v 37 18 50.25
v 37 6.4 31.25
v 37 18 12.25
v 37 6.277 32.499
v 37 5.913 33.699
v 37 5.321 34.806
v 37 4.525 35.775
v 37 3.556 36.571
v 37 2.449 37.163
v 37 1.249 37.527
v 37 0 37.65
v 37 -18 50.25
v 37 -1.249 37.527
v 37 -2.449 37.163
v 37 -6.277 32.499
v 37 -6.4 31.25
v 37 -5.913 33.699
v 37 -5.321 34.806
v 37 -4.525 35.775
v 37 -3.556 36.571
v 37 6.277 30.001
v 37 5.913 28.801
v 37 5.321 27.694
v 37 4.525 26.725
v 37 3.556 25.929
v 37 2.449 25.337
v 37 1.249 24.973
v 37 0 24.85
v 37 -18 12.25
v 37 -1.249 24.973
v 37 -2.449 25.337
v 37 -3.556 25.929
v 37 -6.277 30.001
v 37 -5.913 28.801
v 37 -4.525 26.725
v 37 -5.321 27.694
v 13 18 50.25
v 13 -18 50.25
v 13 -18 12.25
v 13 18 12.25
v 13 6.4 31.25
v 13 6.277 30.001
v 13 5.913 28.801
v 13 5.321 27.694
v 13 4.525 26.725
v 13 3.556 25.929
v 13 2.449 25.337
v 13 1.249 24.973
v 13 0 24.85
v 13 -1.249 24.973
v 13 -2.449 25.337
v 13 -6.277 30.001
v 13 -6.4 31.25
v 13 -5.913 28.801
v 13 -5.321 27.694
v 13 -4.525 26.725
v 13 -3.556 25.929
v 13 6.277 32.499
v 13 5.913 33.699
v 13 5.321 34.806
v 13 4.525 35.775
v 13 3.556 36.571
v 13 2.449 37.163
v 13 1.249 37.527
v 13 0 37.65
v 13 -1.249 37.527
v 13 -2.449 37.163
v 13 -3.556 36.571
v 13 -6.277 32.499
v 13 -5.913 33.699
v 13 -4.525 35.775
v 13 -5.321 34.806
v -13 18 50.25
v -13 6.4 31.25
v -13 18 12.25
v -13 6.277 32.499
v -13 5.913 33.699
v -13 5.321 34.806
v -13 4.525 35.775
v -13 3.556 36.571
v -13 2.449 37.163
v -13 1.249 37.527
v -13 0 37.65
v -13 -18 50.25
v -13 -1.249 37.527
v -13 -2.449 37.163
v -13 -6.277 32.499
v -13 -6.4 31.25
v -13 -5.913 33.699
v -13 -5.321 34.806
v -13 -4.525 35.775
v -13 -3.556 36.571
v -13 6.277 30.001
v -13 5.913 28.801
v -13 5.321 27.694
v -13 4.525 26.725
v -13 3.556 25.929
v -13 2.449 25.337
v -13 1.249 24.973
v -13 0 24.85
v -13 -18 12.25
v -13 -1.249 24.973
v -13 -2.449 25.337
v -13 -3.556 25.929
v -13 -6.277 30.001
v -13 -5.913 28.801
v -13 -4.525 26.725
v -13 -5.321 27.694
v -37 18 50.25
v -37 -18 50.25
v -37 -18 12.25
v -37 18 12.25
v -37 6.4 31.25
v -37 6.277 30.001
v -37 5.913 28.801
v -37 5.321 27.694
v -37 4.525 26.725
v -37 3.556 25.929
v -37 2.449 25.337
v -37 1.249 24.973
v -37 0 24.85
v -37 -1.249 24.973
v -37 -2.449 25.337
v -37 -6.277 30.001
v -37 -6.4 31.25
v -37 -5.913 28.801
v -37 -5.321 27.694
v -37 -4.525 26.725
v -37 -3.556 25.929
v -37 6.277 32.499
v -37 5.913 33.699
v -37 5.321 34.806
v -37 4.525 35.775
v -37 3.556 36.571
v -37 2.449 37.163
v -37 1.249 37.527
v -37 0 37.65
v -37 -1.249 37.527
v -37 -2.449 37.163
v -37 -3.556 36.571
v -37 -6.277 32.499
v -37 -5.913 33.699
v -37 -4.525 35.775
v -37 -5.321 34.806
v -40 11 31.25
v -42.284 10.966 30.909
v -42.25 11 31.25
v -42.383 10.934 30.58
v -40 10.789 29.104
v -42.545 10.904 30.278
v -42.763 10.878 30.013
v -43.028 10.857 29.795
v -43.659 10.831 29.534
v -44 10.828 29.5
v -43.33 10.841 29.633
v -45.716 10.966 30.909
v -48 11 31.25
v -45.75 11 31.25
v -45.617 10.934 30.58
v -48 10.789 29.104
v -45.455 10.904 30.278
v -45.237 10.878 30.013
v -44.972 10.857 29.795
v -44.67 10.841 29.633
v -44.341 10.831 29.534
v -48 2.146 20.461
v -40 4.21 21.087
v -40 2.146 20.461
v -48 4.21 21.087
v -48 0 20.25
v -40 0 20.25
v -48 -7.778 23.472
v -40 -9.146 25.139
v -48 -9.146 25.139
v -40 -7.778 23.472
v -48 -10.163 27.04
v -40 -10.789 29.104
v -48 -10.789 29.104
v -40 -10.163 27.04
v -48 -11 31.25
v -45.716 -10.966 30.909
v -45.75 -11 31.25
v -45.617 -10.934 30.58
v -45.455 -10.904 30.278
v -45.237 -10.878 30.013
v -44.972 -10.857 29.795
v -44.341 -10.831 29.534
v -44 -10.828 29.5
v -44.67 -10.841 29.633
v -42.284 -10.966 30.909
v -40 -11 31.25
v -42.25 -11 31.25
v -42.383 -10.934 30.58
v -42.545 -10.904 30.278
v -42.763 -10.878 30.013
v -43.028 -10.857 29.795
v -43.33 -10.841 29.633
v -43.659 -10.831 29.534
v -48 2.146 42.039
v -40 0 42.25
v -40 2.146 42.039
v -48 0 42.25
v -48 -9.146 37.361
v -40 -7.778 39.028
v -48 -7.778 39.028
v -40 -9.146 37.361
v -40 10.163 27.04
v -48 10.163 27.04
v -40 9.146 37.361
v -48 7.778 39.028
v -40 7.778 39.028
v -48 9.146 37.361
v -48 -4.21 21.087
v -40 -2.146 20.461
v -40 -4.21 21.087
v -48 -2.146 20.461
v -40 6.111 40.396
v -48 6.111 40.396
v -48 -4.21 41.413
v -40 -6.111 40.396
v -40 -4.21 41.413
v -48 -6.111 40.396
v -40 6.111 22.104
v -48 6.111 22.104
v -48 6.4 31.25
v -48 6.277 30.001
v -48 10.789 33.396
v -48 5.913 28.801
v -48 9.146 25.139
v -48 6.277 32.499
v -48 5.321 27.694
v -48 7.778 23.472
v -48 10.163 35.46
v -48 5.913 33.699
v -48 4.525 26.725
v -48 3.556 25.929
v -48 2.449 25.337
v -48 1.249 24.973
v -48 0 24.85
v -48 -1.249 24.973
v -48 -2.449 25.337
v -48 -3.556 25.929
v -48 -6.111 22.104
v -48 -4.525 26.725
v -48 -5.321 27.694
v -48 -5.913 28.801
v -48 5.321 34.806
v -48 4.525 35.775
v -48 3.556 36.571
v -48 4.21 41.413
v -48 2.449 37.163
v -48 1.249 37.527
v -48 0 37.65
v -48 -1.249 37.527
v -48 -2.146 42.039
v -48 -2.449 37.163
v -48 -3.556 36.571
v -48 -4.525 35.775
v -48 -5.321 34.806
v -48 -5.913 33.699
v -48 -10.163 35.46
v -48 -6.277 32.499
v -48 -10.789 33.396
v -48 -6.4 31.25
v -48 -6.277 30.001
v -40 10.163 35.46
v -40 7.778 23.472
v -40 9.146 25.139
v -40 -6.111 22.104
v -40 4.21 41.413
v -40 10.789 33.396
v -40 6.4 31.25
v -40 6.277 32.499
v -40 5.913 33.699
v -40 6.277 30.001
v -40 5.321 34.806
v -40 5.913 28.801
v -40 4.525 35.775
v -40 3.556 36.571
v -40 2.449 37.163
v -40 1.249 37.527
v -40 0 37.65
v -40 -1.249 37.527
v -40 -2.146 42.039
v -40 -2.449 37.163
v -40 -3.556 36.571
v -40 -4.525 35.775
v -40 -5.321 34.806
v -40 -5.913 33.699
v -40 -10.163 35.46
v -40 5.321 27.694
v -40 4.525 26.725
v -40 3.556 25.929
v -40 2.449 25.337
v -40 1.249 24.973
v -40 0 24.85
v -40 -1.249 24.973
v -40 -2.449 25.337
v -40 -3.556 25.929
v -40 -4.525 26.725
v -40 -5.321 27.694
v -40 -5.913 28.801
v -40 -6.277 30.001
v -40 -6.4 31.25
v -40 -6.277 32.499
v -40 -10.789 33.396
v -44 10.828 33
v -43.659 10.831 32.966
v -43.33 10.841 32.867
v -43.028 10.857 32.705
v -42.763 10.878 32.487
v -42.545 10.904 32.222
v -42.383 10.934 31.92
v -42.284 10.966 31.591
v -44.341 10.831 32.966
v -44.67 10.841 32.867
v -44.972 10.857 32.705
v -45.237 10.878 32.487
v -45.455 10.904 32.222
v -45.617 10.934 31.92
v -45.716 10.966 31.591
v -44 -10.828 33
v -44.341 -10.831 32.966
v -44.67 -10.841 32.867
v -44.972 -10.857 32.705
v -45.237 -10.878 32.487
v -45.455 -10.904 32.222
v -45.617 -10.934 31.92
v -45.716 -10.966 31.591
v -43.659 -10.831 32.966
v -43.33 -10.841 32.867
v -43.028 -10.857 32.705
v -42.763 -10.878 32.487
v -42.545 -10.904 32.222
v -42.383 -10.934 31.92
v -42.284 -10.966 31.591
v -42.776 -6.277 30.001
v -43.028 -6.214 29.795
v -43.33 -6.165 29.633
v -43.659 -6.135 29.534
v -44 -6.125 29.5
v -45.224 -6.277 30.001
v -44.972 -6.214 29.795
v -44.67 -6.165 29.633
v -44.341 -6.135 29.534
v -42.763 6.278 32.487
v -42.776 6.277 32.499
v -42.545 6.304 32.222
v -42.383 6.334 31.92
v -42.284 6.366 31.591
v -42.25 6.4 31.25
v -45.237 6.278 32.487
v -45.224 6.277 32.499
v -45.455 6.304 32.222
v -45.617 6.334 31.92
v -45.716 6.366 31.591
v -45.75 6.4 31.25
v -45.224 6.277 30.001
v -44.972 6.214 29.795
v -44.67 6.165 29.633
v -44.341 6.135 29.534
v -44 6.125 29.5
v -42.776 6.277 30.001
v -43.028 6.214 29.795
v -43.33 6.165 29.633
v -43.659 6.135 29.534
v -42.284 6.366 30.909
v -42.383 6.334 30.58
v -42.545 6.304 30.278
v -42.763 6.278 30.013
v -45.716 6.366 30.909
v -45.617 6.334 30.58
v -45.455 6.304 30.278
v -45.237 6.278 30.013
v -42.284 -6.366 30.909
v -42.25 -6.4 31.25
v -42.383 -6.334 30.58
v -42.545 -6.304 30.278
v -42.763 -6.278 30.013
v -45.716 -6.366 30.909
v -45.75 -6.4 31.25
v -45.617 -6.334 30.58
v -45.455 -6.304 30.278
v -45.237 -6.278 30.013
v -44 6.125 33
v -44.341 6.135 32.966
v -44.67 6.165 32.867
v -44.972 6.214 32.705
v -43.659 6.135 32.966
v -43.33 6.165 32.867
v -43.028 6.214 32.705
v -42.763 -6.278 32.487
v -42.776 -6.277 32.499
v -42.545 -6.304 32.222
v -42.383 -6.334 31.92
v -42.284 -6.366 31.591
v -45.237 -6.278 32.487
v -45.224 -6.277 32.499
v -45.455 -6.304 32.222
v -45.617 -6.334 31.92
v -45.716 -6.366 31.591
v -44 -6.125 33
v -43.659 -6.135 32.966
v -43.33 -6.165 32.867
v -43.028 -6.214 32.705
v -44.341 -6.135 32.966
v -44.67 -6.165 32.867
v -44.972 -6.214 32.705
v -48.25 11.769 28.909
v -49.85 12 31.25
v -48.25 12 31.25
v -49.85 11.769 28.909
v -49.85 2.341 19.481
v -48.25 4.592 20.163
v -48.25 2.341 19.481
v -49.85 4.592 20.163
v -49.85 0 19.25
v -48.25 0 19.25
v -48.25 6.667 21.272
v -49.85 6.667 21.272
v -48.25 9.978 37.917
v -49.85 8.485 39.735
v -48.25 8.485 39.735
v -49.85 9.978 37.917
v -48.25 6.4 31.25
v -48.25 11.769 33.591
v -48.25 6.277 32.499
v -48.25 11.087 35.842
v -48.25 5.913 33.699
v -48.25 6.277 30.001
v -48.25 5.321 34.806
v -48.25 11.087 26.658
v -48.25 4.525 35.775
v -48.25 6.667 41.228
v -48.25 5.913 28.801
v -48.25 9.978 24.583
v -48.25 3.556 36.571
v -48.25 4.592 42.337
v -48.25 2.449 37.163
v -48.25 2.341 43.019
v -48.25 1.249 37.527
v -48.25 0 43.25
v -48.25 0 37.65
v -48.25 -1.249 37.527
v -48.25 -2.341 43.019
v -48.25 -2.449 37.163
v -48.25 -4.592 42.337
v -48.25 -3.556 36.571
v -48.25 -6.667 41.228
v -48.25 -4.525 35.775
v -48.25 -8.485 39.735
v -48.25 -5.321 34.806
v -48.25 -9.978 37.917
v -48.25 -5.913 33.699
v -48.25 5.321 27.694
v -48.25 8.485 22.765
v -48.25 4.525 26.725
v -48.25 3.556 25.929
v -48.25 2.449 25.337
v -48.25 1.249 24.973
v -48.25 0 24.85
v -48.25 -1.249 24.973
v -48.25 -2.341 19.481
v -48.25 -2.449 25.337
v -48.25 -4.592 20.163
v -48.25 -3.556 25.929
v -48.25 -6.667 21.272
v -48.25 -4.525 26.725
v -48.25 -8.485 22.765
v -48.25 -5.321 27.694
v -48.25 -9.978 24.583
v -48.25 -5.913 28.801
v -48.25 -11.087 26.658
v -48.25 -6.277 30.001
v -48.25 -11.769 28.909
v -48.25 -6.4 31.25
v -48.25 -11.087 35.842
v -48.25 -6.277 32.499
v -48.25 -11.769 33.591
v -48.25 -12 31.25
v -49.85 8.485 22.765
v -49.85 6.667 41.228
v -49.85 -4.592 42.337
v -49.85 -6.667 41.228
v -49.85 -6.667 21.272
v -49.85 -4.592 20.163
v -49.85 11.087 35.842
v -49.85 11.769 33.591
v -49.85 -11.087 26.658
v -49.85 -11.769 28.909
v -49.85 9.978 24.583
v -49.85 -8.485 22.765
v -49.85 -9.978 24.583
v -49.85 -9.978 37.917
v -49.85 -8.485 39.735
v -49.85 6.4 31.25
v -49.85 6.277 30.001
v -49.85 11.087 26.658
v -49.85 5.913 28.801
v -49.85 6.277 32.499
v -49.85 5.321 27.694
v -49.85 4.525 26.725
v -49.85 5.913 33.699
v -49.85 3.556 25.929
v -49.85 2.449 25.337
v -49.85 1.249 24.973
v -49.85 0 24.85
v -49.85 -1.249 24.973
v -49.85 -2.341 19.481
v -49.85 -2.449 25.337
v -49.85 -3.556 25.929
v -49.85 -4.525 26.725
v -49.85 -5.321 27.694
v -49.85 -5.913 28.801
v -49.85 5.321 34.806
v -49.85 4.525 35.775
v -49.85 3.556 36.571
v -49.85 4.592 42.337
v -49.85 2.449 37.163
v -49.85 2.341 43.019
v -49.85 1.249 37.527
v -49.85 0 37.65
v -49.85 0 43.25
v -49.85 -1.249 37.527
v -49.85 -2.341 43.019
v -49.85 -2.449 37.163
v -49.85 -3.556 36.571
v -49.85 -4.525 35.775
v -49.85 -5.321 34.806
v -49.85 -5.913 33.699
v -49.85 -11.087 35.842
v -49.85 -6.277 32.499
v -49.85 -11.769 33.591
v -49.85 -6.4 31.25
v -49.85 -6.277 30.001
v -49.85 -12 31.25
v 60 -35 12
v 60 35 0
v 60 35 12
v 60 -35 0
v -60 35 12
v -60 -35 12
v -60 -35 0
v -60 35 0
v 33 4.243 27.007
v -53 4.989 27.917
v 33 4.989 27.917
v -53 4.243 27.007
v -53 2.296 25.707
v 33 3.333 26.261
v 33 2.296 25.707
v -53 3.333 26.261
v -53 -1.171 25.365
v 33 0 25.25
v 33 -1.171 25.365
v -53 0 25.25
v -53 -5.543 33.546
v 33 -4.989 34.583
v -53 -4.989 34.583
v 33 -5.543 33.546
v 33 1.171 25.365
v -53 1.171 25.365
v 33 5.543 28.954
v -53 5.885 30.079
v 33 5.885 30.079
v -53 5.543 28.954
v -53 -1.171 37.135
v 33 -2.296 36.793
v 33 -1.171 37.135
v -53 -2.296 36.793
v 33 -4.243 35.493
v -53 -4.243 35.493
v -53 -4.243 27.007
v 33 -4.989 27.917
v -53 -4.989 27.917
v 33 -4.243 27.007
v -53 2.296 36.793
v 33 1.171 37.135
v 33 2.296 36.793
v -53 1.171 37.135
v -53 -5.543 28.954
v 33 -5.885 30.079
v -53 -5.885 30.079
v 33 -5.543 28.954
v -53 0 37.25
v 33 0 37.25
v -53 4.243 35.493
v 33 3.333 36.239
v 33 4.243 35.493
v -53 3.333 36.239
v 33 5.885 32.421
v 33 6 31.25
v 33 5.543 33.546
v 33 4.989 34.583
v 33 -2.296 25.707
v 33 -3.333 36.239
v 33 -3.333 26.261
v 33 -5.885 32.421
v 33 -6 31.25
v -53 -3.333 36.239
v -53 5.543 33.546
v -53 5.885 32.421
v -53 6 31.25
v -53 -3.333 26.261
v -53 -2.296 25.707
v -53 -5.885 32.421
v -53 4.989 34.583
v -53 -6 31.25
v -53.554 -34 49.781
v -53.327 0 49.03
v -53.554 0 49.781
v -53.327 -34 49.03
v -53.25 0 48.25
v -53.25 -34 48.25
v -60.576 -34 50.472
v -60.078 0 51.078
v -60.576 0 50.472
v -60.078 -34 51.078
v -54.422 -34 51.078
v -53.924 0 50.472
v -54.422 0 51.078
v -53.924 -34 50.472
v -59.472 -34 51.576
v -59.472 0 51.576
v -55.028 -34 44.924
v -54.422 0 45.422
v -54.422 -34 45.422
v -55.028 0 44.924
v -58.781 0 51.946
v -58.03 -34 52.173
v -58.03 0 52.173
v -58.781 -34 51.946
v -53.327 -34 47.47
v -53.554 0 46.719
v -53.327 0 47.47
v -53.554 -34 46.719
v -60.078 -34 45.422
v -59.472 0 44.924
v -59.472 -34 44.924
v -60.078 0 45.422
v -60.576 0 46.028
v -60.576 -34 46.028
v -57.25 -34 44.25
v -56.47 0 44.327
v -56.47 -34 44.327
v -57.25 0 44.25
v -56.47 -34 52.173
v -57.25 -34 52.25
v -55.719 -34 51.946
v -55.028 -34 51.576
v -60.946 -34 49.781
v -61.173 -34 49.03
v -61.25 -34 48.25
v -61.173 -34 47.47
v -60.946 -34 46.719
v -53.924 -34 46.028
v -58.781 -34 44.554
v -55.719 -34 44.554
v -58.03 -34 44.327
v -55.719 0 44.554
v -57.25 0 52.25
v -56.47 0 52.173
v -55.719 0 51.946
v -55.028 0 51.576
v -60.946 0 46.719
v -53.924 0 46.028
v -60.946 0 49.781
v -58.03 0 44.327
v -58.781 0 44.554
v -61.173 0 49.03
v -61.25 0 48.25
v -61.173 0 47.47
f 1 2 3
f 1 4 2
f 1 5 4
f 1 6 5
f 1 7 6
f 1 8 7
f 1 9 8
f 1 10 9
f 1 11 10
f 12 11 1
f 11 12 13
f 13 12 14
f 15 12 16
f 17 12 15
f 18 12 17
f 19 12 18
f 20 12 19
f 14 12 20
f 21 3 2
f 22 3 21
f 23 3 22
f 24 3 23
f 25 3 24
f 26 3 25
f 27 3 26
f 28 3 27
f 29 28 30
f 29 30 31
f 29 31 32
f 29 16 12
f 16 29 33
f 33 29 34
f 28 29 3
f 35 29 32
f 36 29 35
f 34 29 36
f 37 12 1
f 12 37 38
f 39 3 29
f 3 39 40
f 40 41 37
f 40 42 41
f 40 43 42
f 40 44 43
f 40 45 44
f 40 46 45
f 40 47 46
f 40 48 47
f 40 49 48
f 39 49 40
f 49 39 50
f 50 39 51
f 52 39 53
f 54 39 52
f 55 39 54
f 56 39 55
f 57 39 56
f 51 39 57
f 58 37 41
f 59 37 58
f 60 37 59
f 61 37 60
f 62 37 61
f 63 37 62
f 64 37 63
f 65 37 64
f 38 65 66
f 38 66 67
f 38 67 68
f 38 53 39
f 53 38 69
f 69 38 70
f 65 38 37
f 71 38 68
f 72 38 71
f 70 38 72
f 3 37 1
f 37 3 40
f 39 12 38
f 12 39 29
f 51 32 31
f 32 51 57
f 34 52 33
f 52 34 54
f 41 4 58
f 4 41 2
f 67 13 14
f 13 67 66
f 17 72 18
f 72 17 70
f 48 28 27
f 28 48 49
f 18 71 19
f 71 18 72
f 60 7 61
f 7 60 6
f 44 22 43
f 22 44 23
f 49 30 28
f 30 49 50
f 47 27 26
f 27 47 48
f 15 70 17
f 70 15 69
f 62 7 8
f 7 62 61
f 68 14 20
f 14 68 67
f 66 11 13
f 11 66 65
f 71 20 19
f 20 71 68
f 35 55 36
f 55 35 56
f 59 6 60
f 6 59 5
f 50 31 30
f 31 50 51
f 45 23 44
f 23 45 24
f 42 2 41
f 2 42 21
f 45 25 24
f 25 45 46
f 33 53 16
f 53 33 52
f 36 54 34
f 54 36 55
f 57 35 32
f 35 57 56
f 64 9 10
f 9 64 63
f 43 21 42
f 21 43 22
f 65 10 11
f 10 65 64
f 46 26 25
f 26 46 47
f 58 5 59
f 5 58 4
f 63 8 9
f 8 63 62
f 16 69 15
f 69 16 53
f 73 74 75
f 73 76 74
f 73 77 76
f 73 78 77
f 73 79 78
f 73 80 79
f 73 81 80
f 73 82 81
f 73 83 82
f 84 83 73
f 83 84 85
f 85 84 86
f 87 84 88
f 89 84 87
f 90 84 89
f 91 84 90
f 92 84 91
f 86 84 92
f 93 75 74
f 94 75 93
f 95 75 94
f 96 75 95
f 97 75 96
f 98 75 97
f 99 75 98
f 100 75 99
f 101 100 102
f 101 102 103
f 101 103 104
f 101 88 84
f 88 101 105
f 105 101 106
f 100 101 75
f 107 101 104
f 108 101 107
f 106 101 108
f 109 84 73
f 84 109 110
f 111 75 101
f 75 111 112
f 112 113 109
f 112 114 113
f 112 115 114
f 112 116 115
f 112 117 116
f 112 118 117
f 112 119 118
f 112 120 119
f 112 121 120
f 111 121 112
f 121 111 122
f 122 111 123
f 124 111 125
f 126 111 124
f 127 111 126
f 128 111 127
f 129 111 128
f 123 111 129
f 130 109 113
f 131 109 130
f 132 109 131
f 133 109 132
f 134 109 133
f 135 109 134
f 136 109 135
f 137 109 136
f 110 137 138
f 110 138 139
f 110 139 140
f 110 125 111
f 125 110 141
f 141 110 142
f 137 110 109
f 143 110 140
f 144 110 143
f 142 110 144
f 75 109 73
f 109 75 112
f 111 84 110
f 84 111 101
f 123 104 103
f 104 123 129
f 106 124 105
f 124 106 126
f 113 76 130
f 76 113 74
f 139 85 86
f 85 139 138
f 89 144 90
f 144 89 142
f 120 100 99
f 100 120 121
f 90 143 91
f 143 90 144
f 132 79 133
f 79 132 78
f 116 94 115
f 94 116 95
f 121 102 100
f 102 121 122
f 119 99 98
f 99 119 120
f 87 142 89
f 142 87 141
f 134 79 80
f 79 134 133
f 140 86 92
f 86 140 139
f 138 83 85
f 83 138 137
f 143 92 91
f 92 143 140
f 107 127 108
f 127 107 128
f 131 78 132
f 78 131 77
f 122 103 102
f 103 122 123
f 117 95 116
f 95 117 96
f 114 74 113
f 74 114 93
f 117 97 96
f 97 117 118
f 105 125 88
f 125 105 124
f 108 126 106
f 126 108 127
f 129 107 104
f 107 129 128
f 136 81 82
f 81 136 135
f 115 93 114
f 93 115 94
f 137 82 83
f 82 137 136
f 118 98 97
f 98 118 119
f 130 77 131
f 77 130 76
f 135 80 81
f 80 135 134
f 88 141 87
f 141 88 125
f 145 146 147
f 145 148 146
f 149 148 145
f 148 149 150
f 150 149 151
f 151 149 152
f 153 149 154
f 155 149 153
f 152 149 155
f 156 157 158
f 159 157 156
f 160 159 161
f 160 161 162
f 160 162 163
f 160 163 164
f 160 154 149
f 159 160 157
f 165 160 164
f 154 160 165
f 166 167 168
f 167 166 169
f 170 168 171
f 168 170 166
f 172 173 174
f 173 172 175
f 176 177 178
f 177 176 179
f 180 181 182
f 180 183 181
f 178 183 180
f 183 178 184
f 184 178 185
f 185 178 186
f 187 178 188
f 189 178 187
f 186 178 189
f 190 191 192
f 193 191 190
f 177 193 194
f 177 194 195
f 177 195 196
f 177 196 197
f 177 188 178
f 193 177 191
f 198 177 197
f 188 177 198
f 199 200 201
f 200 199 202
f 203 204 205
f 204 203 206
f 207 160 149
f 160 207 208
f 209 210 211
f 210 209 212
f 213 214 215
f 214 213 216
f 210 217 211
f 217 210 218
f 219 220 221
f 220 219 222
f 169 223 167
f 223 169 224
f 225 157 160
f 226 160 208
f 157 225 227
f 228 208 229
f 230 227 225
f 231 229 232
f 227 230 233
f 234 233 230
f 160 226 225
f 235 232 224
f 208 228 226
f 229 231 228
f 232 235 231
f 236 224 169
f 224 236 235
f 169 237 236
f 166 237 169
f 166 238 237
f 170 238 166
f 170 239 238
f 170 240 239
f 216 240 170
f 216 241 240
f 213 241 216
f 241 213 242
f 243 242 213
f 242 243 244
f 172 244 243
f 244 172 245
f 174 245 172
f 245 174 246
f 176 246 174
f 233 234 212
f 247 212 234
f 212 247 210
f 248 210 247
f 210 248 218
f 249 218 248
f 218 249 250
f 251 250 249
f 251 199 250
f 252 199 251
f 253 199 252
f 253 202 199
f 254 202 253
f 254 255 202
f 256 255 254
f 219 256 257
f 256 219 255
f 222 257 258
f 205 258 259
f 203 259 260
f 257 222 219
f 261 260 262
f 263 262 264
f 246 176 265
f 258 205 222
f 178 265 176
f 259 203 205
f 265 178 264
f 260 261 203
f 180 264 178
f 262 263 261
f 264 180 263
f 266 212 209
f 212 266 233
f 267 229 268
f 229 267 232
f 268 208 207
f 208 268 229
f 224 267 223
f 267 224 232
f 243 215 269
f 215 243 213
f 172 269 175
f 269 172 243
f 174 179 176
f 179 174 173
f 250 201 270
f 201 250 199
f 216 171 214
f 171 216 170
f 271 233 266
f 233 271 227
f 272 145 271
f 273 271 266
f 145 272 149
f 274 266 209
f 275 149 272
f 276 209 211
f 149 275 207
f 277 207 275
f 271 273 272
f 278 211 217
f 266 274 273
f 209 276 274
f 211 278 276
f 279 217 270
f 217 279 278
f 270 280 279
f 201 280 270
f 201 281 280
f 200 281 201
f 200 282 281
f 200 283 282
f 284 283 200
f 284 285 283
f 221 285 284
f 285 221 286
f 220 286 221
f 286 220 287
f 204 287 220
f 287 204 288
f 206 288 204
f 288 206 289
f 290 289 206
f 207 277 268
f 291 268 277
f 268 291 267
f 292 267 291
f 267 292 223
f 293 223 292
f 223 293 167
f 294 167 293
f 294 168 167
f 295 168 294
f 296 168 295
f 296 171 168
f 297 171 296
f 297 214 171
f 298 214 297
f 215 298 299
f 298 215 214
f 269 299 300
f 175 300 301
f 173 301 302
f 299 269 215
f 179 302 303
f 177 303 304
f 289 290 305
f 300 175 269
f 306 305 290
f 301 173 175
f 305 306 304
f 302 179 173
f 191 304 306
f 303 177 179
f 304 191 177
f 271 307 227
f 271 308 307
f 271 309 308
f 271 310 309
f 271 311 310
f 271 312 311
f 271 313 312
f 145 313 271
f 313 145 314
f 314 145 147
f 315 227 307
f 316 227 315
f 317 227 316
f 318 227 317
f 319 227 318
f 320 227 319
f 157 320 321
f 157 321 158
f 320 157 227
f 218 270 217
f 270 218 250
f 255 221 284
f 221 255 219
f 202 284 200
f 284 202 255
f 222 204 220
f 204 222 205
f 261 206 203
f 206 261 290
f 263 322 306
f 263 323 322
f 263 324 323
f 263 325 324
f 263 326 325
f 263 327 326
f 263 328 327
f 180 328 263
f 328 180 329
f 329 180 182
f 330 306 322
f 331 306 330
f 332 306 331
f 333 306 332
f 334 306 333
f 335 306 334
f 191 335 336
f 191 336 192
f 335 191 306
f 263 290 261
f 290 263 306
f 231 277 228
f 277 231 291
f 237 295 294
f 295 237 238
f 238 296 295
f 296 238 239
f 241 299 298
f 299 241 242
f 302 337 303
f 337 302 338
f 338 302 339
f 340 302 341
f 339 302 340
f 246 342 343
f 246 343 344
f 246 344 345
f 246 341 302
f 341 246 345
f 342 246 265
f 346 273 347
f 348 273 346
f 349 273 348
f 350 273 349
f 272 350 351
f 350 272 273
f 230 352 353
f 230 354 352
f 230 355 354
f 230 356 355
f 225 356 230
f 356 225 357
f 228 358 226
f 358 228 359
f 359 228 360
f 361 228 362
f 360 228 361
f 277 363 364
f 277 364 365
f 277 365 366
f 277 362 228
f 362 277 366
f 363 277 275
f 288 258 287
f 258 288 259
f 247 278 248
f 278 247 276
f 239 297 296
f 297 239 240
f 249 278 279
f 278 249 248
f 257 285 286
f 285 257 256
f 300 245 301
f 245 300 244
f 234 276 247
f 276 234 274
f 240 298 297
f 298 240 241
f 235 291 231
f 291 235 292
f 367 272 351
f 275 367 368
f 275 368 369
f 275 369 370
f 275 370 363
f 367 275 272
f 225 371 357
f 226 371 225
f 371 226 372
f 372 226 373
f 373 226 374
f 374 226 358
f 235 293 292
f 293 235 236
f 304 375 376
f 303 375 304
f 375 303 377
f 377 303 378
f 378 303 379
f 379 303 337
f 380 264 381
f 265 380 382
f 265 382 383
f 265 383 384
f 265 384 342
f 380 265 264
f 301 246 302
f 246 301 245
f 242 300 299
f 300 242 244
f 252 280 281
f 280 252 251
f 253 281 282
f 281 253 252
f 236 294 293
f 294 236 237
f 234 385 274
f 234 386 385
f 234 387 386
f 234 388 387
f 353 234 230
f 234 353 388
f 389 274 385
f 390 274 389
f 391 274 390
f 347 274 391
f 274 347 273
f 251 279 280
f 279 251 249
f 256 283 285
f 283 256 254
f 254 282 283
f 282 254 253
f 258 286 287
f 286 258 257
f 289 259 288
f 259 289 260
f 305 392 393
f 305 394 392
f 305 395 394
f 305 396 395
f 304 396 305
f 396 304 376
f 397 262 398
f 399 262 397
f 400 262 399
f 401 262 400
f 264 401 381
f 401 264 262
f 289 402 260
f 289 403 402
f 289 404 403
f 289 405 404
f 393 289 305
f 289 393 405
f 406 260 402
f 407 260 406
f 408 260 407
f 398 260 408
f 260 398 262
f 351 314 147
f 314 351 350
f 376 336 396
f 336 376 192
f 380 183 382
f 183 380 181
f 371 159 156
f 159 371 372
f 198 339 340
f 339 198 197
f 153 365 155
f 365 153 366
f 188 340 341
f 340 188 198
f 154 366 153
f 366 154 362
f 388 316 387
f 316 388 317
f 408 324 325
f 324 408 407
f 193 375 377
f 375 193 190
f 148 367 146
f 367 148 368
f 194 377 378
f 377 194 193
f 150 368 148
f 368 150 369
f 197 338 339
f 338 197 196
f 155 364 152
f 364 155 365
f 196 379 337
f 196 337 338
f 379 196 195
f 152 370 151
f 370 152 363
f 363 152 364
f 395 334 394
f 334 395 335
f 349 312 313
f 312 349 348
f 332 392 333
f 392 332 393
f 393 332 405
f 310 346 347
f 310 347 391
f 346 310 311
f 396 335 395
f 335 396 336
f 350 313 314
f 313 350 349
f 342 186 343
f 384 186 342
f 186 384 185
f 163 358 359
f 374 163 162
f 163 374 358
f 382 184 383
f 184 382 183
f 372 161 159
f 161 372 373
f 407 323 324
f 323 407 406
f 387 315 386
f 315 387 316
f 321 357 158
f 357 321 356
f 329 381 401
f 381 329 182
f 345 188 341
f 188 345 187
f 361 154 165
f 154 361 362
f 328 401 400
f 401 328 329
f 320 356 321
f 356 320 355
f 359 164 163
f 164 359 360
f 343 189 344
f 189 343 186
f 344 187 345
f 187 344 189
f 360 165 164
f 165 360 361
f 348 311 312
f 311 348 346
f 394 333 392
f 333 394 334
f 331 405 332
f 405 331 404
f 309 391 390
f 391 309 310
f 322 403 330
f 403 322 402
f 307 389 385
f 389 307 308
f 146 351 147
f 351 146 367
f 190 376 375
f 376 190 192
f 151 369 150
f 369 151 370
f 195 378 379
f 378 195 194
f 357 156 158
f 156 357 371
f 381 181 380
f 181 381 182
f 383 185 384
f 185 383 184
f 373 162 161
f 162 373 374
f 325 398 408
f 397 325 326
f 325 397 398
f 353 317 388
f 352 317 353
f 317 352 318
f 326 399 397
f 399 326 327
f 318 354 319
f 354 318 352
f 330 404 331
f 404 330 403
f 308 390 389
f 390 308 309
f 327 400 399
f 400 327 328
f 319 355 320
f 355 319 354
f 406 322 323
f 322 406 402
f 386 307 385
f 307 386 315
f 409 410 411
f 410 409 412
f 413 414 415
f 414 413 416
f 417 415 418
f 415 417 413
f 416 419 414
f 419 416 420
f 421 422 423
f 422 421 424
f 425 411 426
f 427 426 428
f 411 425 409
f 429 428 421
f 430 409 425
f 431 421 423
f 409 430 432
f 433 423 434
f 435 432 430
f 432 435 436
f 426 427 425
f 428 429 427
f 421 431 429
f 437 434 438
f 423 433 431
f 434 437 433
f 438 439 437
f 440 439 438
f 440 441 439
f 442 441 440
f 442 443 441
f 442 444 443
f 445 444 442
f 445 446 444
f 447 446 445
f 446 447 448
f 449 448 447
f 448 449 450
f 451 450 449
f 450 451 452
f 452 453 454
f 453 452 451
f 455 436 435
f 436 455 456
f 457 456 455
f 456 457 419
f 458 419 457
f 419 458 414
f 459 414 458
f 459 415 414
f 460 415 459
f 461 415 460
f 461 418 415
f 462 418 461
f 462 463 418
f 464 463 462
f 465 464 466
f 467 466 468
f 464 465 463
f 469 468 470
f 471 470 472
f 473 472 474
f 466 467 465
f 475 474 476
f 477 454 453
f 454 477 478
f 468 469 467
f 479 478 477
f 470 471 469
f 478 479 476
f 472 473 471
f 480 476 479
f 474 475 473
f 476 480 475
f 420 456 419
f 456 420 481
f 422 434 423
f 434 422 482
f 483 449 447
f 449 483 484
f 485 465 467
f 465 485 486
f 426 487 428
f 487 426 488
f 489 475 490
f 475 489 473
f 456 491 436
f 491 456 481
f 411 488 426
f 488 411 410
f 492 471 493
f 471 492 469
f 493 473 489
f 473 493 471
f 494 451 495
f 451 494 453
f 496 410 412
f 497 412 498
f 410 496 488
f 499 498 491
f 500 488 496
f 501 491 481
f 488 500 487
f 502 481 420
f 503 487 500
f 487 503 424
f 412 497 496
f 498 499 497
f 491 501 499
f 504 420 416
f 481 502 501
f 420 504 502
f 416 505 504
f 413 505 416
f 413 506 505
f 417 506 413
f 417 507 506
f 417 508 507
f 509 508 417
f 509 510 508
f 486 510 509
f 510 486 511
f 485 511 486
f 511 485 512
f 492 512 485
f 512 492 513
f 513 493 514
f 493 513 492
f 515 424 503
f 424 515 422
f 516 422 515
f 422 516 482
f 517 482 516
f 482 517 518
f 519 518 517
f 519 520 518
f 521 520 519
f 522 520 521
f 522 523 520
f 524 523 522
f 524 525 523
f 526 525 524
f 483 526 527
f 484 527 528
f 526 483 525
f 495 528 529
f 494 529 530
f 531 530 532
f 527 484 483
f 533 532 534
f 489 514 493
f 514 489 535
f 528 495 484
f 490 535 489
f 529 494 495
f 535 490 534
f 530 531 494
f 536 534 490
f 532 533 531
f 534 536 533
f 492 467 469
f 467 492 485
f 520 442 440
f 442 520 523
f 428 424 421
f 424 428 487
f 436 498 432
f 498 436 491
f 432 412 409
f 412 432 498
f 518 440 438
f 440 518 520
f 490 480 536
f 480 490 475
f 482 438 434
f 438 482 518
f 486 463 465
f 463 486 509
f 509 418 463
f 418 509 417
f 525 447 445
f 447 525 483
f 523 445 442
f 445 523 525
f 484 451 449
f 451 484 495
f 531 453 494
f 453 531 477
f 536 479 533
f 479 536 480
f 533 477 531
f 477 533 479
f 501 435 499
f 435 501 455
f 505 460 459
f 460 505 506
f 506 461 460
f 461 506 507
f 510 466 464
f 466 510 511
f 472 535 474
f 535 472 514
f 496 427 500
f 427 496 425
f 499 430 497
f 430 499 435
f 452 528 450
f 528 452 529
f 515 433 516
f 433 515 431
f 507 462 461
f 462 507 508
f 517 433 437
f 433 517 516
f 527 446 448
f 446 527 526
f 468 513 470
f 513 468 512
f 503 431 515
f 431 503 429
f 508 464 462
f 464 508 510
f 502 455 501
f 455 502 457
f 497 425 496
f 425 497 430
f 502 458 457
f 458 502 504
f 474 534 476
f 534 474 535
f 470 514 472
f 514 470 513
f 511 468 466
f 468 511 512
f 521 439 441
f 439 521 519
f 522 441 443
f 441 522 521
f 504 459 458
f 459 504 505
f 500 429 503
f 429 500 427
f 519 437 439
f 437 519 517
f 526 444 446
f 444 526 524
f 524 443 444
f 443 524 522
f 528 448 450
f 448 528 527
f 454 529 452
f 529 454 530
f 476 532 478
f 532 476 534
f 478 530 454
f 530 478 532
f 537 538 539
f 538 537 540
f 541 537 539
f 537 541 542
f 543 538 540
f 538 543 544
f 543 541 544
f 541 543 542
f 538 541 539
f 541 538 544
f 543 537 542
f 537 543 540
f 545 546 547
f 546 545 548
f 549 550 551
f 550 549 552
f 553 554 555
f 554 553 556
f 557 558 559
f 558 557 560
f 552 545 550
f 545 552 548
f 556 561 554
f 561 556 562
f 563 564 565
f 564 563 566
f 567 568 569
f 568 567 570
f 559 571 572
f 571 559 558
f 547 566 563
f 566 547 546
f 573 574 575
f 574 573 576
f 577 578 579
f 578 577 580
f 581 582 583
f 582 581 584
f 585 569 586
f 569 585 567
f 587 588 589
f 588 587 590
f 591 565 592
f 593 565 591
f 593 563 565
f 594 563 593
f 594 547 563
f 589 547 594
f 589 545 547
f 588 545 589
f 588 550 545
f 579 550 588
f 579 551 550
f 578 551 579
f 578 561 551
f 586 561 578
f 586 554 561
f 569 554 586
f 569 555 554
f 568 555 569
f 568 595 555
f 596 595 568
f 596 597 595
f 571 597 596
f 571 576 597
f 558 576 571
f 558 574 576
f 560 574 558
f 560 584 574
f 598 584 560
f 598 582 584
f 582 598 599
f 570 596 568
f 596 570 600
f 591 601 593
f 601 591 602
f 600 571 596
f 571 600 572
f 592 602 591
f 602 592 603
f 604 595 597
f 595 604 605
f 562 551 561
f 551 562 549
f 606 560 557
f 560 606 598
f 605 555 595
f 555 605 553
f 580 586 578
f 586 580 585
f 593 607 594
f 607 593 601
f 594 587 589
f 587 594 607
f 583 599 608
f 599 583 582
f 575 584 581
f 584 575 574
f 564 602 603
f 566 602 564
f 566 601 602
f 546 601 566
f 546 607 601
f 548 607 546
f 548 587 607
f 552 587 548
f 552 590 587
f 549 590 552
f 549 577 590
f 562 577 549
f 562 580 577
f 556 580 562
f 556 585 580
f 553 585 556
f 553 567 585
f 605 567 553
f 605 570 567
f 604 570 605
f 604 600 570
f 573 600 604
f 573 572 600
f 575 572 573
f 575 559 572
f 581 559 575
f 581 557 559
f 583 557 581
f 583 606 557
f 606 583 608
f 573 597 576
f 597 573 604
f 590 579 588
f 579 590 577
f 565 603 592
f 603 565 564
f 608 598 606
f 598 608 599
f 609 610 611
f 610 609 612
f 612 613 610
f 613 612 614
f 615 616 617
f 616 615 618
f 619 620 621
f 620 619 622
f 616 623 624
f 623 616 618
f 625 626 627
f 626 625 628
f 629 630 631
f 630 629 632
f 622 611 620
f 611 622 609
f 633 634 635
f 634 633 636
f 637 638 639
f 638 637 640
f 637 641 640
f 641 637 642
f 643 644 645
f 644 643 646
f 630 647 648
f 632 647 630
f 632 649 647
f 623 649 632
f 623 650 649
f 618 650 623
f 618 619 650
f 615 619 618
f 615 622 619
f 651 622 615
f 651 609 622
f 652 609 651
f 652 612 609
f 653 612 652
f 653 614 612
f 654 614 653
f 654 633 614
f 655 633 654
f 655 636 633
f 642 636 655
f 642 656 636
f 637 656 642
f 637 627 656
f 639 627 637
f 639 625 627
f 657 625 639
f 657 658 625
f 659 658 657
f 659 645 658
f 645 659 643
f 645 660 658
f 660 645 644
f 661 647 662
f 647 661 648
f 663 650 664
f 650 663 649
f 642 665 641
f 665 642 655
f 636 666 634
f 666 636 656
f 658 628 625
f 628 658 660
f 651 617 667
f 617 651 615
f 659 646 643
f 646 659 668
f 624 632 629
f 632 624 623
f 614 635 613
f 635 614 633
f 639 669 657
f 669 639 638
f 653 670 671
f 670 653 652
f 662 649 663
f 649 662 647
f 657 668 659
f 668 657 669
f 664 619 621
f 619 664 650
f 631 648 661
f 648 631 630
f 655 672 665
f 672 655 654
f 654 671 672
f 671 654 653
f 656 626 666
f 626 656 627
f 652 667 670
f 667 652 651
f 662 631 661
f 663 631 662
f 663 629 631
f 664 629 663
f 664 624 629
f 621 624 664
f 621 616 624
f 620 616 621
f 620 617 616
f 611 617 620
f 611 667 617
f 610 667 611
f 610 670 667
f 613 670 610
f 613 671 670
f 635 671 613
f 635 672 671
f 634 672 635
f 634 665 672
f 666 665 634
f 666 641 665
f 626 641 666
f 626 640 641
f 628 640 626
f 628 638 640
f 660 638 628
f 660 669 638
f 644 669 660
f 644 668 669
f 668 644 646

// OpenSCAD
$fn = 32;

// ------------------------------------------------------------------------
// Machine vise: screw d12, jaws 24 x 38 mm
// Every part is its own module, assembly() places every instance.
// ------------------------------------------------------------------------

// --- part 1 ---
module vise_bed() {
  difference() {
    translate([-60, -35, 0]) cube([120, 70, 12]);
  }
}

// --- part 2 ---
module vise_jaw() {
  difference() {
    translate([-12, -18, 0]) cube([24, 36, 38]);
    translate([0, 0, 19]) rotate([0, 90, 0]) cylinder(h = 26, d = 12.8, center = true);
  }
}

// --- part 3 ---
module vise_screw() {
  translate([0, 0, -43]) cylinder(h = 86, d = 12);
}

// --- part 4 ---
module screw_collar() {
  difference() {
    cylinder(h = 8, d = 22);
    translate([0, 0, -1]) cylinder(h = 10, d = 12.8);
    translate([0, 0, 4]) rotate([90, 0, 0]) cylinder(h = 24, d = 3.5, center = true);
  }
}

// --- part 5 ---
module screw_washer() {
  difference() {
      translate([0, 0, 0]) cylinder(h = 1.6, d = 24);
      translate([0, 0, -1]) cylinder(h = 3.6, d = 12.8);
    }
}

// --- part 6 ---
module vise_handle() {
  cylinder(h = 34, d = 8);
}

// --- assembly ---
module assembly() {
  color([0.80, 0.24, 0.20]) translate([0, 0, 0]) rotate([0, 0, 0]) vise_bed();
  color([0.20, 0.45, 0.75]) translate([25, 0, 12.25]) rotate([0, 0, 0]) vise_jaw();
  color([0.25, 0.62, 0.32]) translate([-25, 0, 12.25]) rotate([0, 0, 0]) vise_jaw();
  color([0.92, 0.70, 0.18]) translate([-10, 0, 31.25]) rotate([0, 90, 0]) vise_screw();
  color([0.58, 0.35, 0.70]) translate([-48, 0, 31.25]) rotate([0, 90, 0]) screw_collar();
  color([0.16, 0.66, 0.66]) translate([-49.85, 0, 31.25]) rotate([0, 90, 0]) screw_washer();
  color([0.85, 0.48, 0.18]) translate([-57.25, 0, 48.25]) rotate([90, 0, 0]) vise_handle();
}

assembly();
